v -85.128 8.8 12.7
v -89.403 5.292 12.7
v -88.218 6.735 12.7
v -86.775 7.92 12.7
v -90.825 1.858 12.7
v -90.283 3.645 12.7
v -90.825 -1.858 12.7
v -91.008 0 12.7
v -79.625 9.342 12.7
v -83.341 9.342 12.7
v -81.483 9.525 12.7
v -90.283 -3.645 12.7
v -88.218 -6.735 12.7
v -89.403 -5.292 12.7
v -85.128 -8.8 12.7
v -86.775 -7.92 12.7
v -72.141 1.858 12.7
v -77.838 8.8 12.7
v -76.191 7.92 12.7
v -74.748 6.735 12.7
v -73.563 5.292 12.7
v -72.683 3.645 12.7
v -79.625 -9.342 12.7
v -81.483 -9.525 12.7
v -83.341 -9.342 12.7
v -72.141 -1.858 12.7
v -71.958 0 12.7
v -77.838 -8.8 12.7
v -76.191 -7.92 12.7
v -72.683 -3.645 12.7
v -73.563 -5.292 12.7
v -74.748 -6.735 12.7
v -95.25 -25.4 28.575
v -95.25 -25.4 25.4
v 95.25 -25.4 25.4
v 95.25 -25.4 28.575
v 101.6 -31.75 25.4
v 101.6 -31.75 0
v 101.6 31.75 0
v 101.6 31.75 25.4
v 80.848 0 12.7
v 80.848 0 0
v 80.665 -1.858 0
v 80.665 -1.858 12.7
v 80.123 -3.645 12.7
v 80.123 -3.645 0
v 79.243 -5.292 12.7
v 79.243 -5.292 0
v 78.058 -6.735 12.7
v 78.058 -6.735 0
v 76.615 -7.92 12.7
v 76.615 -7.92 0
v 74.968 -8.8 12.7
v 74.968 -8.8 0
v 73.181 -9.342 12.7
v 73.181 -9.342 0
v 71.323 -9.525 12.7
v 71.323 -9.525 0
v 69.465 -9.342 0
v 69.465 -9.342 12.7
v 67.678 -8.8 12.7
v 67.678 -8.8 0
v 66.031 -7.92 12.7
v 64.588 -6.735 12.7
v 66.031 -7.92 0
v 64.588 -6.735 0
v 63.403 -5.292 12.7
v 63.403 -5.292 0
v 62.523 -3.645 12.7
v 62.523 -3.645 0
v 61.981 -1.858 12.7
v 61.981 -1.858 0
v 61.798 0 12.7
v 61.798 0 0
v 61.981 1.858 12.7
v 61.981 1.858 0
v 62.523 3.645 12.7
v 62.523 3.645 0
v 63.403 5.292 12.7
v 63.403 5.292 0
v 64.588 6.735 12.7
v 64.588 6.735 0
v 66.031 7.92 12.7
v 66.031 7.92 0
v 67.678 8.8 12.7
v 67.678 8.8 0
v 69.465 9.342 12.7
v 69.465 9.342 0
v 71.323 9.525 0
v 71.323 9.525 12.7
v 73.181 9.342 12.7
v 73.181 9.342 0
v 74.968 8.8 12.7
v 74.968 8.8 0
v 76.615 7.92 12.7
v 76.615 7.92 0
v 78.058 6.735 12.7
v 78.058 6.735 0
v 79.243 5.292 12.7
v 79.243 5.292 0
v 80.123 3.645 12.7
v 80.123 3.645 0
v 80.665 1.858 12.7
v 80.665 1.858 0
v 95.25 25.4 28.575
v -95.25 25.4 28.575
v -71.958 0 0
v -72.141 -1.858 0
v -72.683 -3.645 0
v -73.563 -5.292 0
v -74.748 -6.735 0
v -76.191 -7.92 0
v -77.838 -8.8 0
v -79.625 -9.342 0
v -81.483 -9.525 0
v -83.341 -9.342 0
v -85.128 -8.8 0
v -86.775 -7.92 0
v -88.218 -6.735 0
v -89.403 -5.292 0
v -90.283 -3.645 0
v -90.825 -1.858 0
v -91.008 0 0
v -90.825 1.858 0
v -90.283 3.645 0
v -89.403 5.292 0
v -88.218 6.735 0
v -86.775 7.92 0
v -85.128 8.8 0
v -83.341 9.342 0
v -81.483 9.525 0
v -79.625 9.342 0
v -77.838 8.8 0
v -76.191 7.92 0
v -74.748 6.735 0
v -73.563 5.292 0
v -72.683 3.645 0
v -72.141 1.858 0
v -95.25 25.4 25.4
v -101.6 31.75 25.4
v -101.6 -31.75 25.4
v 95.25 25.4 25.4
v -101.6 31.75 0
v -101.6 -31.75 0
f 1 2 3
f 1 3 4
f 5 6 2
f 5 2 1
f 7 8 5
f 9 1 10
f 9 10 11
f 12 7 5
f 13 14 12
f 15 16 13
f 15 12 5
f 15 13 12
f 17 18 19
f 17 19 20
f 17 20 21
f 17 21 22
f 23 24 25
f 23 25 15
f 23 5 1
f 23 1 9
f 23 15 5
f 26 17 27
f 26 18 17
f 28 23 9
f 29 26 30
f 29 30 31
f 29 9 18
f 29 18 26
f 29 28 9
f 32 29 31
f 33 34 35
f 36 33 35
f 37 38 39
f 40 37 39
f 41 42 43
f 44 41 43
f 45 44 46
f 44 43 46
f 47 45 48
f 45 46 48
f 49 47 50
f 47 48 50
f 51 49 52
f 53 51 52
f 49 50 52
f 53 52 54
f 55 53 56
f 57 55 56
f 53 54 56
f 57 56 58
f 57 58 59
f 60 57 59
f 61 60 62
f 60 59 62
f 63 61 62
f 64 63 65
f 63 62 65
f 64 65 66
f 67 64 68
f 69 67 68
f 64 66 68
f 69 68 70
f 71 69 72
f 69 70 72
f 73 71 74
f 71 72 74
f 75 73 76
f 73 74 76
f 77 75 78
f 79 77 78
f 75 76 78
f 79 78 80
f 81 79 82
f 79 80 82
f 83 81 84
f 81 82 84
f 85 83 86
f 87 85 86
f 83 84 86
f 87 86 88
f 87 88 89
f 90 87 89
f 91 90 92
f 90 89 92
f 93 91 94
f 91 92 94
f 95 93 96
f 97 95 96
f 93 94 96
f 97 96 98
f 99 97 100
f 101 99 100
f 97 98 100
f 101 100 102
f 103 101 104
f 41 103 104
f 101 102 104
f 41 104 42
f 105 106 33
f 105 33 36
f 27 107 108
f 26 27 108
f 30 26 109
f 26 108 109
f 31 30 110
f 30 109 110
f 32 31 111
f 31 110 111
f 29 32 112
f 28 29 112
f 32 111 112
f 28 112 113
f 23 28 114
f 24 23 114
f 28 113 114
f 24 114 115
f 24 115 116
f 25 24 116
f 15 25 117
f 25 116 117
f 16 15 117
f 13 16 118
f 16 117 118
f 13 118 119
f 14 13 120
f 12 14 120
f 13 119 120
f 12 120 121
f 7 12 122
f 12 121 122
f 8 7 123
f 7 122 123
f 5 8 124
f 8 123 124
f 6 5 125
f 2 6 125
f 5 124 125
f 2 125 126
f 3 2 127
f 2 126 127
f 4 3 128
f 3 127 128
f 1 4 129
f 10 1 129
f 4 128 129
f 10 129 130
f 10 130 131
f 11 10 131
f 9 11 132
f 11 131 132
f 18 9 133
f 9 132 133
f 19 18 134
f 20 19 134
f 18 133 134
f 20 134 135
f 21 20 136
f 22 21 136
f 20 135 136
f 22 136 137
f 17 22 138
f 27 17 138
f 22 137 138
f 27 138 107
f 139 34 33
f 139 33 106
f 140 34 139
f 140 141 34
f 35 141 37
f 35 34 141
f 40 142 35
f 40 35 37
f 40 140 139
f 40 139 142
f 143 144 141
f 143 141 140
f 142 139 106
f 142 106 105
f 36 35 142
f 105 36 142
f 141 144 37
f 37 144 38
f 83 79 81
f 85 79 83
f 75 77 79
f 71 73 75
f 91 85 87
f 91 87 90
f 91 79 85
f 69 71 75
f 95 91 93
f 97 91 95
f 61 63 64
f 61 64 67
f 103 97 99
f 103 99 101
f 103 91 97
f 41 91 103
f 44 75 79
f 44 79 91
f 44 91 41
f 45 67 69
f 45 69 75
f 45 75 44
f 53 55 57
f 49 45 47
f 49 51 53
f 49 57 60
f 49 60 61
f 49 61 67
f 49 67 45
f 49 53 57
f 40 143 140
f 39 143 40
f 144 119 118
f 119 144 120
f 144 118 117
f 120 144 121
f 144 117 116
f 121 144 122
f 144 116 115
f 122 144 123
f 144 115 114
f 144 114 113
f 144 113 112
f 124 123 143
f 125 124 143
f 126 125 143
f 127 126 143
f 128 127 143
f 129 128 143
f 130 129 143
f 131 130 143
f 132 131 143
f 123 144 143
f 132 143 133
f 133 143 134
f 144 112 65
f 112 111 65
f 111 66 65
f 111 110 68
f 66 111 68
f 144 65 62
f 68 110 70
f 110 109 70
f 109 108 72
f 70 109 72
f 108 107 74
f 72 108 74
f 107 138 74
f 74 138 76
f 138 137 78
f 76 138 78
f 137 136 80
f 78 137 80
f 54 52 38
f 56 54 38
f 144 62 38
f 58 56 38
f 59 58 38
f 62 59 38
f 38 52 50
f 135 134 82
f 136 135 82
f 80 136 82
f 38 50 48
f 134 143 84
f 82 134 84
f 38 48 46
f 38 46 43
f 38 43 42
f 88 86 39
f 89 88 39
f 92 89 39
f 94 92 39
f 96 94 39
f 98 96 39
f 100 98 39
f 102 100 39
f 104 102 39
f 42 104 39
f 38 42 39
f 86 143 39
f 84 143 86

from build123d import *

# Parameters (mm, degrees)
F0_W     = 203.2
F0_H     = 63.5
F1_DEPTH = 25.4
F2_R     = 9.525
F3_DEPTH = 12.7
F4_W     = 190.5
F4_H     = 50.8
F5_DEPTH = 3.175


with BuildPart() as f1:
    # F0 (on Top) → F1 (new body)
    with BuildSketch(Plane.XY):
        Rectangle(F0_W, F0_H)
    extrude(amount=F1_DEPTH)

    # F2 (on face) → F3 (cut)
    with BuildSketch(Plane(origin=(0, 0, 0), x_dir=(1, 0, 0), z_dir=(0, 0, -1))):
        with Locations((-81.4832, 0)):
            Circle(F2_R)
        with Locations((71.3232, 0)):
            Circle(F2_R)
    extrude(amount=-F3_DEPTH, mode=Mode.SUBTRACT)

    # F4 (on face) → F5 (join)
    with BuildSketch(Plane.XY.offset(25.4)):
        Rectangle(F4_W, F4_H)
    extrude(amount=F5_DEPTH)


solid = f1.part
